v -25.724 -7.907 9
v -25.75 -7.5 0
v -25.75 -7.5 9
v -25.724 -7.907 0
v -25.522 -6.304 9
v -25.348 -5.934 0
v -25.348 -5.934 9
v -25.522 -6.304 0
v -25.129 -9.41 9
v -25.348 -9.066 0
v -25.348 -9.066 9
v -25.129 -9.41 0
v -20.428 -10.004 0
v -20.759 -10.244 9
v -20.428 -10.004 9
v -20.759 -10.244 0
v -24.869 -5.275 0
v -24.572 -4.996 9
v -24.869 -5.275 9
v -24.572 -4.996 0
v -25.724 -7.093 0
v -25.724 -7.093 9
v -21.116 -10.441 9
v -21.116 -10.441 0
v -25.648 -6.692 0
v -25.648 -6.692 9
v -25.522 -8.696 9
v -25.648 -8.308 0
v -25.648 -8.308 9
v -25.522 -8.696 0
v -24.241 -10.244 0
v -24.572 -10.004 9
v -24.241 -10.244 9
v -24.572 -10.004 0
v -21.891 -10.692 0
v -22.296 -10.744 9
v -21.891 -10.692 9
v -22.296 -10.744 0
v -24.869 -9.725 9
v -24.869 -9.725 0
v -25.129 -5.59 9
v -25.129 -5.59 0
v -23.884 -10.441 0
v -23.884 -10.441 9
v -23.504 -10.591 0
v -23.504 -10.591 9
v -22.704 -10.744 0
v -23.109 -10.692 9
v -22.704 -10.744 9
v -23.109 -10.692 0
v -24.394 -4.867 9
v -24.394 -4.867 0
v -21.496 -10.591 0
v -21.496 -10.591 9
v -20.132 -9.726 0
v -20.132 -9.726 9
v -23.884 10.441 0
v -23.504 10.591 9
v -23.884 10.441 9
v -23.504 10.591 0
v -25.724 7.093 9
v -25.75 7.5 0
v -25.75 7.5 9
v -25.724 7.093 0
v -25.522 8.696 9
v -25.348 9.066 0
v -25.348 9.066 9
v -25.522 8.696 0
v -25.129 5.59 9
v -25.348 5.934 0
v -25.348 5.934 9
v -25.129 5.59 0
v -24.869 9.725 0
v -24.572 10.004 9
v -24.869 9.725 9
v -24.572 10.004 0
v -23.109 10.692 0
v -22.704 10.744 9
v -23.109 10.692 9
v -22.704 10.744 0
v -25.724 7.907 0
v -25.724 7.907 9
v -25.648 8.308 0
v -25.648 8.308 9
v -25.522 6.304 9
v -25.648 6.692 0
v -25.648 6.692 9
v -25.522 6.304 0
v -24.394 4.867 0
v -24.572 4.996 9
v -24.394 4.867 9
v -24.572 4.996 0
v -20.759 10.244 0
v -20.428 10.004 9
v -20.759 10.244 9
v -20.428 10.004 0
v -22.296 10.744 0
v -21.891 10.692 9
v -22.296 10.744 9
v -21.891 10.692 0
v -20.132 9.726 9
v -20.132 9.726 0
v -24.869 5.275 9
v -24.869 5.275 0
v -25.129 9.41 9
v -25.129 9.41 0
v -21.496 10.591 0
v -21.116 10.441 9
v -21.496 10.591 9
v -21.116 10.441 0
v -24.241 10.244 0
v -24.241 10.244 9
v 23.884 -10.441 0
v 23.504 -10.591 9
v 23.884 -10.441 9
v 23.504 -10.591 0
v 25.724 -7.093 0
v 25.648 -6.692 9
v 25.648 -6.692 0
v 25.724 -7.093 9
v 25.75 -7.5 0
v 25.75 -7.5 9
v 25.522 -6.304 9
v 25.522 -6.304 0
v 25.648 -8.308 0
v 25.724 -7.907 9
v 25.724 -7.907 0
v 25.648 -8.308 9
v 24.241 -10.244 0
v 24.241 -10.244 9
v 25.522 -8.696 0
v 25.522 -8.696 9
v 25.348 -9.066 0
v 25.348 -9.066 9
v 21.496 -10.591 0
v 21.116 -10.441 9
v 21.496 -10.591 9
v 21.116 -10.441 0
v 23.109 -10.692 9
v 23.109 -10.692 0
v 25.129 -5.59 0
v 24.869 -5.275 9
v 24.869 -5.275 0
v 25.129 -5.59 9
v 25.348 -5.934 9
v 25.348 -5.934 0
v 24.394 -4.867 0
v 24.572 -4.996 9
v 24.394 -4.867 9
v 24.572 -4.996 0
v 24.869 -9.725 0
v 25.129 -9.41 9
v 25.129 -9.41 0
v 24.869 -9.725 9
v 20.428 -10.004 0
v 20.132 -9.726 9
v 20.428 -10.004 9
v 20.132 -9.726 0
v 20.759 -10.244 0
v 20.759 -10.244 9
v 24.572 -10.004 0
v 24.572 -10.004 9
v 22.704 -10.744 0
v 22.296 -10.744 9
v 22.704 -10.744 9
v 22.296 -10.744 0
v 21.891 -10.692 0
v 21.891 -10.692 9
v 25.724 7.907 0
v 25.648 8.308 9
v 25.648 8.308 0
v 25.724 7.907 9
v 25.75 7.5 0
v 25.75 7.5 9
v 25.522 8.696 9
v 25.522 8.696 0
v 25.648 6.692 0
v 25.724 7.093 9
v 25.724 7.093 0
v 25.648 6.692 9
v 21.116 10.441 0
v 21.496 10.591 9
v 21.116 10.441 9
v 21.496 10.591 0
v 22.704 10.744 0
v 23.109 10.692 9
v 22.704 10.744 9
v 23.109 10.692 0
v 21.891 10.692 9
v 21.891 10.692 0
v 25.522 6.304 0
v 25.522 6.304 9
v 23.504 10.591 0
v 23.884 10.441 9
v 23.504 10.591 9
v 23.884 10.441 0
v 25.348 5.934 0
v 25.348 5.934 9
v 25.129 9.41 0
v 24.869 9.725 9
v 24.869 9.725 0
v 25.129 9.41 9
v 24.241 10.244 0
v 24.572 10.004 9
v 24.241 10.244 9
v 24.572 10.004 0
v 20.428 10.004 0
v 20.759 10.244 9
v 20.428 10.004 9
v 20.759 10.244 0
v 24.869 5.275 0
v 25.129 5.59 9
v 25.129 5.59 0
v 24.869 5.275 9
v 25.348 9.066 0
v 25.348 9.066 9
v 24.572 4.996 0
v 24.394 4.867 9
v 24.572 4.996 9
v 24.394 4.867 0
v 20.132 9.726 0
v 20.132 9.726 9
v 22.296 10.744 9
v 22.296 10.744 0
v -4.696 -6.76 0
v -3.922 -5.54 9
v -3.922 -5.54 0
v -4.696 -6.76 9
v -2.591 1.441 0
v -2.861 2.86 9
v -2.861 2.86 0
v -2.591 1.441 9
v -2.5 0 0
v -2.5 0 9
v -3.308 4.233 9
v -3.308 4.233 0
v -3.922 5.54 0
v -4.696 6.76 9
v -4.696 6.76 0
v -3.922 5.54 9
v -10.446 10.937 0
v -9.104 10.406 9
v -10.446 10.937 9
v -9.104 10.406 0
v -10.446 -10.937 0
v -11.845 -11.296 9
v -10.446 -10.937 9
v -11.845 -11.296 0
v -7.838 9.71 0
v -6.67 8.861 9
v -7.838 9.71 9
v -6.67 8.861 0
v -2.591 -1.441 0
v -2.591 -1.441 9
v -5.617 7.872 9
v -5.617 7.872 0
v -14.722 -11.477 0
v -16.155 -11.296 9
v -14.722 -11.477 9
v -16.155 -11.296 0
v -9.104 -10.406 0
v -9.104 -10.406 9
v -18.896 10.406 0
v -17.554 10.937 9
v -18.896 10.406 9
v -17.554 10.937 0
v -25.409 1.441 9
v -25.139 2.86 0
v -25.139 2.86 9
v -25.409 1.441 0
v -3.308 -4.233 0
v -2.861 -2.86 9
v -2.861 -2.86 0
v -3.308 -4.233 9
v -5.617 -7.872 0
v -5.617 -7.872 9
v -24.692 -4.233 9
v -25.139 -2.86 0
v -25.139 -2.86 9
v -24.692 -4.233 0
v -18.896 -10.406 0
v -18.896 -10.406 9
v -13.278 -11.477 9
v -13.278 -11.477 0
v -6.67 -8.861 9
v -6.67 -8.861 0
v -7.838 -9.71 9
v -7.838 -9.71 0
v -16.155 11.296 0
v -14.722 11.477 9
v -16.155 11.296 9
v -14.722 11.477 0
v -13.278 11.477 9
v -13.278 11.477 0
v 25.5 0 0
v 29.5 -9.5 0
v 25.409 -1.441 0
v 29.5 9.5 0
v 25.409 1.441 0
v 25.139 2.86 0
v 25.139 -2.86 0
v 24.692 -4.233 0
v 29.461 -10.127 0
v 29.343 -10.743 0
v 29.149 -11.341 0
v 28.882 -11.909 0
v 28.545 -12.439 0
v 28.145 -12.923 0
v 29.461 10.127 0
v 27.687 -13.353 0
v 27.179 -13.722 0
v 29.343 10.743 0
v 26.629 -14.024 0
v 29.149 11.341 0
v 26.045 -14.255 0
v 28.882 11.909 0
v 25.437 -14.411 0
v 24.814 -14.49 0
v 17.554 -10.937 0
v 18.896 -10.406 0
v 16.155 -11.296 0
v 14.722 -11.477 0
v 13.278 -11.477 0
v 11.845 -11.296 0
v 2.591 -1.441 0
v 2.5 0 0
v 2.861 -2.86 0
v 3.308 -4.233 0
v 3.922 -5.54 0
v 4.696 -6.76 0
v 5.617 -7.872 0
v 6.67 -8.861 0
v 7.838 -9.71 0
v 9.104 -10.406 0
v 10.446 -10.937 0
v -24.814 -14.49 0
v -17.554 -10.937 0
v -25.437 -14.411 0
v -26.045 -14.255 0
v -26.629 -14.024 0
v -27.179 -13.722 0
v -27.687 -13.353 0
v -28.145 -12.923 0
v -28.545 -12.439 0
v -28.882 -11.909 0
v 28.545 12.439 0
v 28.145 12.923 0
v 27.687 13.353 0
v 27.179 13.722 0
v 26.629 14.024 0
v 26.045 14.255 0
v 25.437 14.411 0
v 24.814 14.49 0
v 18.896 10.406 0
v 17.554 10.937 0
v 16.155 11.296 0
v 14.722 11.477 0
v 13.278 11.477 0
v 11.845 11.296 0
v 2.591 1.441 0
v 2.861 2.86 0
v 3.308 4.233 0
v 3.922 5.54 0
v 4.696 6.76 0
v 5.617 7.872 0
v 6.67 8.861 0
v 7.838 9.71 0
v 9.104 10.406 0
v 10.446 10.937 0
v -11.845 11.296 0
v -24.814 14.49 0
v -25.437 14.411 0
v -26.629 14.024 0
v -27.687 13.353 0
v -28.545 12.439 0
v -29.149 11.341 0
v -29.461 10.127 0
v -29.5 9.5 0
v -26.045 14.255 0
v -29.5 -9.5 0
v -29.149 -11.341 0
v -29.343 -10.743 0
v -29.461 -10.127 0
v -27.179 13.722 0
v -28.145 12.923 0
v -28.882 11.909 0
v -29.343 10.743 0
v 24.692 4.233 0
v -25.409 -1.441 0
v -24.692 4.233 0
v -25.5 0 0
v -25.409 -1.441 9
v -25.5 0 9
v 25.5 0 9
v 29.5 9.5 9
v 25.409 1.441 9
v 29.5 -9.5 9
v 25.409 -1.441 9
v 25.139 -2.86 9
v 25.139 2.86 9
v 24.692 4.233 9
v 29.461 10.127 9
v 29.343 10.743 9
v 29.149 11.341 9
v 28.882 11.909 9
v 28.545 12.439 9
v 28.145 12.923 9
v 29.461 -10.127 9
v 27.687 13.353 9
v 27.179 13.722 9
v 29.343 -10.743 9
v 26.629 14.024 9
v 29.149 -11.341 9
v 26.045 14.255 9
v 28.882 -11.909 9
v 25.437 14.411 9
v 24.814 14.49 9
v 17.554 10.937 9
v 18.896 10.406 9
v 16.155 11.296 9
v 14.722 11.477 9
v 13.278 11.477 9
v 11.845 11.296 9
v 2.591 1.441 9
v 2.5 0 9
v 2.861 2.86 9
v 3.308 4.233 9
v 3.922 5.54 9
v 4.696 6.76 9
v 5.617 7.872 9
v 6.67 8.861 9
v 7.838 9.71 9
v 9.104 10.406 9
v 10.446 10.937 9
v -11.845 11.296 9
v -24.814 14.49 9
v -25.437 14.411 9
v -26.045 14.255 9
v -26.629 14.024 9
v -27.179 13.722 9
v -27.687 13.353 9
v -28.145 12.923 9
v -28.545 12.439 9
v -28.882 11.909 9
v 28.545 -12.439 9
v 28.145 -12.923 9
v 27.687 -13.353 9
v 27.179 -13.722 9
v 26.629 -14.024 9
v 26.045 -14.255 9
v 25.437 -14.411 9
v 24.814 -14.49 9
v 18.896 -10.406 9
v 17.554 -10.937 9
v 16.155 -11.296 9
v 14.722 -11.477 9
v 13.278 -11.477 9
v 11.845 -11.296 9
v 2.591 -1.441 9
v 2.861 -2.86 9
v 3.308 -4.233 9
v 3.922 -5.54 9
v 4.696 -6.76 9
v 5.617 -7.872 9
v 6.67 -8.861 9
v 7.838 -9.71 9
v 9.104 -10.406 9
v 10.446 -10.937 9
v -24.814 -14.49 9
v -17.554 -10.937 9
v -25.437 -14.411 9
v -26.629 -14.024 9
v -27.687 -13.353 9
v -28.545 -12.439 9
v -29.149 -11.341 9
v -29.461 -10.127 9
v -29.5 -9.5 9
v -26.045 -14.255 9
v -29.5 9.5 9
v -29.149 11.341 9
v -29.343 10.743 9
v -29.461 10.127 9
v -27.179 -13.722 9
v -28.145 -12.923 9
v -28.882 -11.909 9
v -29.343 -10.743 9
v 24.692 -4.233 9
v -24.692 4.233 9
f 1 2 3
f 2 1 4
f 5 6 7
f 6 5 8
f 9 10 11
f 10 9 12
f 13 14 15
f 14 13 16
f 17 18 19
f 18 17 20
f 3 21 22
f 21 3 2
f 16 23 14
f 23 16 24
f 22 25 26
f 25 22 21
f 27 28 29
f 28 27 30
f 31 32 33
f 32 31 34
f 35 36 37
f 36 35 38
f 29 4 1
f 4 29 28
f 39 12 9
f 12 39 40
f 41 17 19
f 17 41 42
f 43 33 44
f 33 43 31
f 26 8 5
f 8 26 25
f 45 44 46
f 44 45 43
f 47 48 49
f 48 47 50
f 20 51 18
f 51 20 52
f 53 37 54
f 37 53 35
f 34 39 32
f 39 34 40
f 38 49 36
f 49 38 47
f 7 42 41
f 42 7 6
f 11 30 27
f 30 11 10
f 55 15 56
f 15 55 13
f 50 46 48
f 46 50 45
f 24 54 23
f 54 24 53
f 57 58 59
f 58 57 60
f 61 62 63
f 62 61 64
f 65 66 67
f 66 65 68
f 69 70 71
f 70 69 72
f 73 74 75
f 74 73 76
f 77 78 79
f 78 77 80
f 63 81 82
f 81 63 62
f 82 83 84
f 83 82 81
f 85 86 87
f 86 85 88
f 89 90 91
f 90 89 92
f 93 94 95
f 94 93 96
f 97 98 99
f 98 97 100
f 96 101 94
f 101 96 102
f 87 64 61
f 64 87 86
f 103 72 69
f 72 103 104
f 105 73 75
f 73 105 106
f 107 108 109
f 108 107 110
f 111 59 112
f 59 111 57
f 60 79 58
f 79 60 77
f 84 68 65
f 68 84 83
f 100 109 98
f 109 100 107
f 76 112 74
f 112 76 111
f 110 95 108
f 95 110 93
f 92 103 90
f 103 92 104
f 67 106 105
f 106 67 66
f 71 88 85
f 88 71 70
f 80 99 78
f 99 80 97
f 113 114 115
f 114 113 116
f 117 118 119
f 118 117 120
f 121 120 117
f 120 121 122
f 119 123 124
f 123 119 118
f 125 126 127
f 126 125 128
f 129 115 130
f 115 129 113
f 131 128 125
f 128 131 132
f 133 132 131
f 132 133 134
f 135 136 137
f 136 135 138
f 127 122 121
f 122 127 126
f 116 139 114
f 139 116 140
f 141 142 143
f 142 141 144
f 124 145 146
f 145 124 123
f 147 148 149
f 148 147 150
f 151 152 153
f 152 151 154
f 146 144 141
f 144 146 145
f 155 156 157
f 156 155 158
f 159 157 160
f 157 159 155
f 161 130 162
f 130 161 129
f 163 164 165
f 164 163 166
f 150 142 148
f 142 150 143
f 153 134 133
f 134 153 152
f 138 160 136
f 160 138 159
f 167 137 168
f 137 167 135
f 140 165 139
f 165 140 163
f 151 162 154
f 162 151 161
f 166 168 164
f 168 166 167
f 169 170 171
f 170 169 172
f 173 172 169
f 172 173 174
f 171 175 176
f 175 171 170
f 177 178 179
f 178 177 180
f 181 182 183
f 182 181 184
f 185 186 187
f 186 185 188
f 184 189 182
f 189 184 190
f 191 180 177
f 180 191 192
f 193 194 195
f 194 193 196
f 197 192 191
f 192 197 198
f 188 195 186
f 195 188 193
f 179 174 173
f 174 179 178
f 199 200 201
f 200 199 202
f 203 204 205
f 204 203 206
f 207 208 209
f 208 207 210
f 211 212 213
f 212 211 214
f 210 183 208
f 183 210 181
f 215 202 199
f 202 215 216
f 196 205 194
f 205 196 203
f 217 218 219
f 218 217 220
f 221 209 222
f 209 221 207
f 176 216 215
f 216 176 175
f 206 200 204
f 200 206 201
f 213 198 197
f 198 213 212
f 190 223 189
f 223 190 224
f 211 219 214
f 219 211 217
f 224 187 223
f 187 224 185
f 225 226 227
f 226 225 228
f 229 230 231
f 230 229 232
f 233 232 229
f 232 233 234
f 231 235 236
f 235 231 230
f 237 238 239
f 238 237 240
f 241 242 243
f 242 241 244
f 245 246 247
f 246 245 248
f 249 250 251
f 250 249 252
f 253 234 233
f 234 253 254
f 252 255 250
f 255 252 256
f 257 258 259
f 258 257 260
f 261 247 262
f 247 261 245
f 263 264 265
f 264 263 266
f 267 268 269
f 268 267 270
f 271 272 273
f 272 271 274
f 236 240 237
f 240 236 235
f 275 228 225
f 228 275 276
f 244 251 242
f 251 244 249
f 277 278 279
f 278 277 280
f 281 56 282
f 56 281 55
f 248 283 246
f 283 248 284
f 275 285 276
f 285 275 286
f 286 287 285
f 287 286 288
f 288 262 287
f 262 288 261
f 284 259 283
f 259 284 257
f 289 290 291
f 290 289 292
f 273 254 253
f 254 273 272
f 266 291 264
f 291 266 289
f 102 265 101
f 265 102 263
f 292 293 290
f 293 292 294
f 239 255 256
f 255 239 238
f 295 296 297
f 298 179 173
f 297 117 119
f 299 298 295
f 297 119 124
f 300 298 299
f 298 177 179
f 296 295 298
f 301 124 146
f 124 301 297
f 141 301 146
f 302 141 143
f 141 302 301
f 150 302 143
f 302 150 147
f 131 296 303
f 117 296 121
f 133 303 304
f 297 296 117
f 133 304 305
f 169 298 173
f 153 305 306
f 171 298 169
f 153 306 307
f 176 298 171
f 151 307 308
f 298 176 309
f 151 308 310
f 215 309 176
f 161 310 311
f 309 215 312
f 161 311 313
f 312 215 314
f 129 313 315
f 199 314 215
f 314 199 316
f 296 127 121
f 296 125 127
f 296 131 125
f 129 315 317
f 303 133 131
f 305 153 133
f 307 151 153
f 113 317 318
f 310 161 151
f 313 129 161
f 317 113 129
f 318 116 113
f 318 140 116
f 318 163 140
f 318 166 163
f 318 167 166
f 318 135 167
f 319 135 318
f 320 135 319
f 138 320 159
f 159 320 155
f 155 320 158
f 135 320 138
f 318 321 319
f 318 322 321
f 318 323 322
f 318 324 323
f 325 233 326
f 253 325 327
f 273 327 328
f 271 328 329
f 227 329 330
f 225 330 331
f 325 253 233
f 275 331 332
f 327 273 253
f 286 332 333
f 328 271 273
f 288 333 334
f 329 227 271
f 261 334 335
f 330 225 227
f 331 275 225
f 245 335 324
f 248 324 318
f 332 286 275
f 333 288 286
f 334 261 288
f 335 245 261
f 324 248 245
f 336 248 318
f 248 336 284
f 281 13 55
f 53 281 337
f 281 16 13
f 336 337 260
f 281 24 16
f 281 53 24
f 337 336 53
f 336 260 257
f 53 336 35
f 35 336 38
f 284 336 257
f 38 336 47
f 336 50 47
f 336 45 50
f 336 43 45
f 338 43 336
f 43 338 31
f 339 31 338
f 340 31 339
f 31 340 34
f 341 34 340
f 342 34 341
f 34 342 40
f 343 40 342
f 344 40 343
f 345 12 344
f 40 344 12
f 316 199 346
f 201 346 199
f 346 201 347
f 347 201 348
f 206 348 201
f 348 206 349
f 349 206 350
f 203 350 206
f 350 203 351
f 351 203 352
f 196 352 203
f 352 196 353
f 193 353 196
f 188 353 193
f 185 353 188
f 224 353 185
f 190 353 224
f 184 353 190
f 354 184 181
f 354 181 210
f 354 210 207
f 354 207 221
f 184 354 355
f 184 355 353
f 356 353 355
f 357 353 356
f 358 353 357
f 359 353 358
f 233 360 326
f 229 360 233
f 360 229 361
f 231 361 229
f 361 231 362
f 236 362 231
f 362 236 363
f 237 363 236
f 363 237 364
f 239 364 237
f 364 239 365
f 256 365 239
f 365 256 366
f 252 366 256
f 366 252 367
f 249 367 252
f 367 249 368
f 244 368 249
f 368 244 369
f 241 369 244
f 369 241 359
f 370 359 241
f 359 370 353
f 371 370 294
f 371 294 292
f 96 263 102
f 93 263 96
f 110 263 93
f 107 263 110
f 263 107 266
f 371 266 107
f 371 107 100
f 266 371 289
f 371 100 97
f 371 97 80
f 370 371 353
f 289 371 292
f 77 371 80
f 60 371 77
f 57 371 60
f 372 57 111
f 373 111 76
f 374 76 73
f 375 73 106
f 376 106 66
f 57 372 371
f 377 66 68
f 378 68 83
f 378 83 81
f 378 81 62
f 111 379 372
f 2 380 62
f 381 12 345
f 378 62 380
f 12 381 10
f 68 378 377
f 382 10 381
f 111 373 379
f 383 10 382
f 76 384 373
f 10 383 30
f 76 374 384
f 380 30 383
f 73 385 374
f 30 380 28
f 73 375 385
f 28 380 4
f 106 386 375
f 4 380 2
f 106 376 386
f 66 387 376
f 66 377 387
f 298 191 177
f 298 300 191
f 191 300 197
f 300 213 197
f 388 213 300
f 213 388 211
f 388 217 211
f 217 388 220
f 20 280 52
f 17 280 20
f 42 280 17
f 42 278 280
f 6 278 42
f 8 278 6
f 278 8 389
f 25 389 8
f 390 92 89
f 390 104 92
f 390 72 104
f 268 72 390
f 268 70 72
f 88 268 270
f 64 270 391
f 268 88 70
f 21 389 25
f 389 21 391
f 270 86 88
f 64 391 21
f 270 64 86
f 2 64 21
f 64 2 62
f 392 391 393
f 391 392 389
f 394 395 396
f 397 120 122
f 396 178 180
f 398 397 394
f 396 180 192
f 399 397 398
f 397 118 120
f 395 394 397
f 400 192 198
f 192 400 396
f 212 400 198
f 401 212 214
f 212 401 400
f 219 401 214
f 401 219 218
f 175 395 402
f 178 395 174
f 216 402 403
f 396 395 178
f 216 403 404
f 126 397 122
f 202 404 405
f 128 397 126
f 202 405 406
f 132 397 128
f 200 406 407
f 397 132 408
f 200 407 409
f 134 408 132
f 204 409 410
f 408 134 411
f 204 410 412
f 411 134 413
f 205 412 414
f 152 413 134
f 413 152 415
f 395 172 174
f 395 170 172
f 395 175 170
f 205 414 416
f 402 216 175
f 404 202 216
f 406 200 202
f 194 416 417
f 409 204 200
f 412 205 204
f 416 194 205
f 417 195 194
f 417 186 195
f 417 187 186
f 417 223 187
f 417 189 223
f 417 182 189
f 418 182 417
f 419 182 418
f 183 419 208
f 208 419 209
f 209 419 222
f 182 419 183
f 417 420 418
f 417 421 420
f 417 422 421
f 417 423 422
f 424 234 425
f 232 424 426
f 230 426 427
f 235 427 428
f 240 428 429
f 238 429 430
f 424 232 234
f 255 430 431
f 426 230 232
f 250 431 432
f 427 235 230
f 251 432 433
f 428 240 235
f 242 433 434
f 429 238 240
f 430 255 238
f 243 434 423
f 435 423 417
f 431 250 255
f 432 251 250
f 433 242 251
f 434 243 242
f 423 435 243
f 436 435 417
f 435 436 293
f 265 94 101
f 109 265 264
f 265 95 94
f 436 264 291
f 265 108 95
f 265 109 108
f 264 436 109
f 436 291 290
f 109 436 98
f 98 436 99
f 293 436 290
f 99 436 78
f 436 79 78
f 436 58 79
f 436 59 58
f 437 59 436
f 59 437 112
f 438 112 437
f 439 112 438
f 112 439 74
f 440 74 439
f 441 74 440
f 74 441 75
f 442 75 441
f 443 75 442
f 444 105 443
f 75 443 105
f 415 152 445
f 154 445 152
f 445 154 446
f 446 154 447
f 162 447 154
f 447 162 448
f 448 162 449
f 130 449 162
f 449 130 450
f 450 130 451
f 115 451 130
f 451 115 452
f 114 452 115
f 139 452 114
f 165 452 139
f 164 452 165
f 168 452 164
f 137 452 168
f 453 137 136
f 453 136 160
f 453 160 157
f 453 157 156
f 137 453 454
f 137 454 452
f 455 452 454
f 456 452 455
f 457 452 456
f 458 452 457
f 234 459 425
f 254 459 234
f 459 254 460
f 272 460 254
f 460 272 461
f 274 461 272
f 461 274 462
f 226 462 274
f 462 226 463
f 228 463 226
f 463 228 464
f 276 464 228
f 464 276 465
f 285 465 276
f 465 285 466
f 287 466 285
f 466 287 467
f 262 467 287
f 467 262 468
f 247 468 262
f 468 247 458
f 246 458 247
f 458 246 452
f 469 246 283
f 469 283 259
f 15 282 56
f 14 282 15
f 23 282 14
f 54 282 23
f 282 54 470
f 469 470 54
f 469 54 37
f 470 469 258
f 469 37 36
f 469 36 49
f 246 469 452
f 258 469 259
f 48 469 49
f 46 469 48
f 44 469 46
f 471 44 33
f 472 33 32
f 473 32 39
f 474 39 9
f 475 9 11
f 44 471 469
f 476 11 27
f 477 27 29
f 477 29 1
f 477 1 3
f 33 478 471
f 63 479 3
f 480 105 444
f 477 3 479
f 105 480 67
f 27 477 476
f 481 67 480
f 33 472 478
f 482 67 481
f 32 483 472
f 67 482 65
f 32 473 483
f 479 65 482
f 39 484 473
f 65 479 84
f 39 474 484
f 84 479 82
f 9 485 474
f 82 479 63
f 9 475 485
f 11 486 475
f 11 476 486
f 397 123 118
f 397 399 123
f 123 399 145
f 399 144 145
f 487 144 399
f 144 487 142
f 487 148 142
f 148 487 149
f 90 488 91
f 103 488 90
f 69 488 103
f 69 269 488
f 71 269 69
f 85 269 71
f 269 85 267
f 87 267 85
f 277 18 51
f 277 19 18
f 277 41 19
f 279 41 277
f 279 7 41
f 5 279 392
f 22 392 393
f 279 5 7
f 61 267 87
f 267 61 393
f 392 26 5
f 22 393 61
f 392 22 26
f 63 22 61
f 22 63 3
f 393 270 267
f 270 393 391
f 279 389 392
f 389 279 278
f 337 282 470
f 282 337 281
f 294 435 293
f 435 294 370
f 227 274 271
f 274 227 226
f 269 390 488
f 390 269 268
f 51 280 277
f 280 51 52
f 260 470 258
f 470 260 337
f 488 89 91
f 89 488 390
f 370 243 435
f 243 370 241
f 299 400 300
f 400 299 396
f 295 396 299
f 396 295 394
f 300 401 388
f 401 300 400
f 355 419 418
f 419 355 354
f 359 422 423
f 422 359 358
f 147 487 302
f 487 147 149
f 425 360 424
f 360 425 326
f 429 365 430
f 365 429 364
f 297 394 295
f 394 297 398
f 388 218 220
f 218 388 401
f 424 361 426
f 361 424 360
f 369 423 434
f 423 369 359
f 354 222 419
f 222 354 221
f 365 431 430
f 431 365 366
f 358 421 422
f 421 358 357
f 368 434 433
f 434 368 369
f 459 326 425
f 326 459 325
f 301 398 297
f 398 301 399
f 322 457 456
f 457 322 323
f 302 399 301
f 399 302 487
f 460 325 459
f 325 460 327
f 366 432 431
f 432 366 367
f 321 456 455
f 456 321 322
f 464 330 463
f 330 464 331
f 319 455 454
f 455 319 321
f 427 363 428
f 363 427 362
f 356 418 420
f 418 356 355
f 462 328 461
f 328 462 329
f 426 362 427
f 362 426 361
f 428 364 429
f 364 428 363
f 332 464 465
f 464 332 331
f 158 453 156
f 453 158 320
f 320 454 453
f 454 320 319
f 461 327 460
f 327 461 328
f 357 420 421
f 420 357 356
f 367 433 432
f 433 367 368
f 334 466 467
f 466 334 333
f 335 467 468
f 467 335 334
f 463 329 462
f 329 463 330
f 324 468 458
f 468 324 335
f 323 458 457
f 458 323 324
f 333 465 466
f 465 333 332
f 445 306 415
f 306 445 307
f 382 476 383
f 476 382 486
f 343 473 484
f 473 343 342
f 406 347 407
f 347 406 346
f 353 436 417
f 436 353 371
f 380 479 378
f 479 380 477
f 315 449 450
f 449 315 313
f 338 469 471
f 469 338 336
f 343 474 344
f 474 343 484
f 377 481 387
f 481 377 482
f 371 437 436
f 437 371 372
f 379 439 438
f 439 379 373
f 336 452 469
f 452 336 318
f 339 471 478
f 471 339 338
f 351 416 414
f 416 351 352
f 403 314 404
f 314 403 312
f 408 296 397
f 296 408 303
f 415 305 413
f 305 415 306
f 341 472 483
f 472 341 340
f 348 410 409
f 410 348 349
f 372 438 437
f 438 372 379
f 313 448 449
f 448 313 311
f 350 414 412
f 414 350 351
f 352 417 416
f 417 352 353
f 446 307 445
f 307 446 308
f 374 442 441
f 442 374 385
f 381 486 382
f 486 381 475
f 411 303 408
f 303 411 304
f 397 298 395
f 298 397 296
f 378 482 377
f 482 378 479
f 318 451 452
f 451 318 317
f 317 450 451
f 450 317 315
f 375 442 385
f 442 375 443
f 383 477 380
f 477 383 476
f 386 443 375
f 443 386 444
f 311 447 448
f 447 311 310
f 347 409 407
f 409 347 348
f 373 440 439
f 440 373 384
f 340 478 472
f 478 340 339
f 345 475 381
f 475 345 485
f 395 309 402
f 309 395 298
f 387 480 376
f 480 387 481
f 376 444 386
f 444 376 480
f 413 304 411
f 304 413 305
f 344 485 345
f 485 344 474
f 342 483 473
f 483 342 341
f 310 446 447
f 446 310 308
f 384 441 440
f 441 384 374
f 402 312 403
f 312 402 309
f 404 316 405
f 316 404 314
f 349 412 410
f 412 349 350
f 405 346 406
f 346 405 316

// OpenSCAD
$fn = 50;


difference() {
	union() {
		hull() {
			translate(v = [-24.5000000000, 9.5000000000, 0]) {
				cylinder(h = 9, r = 5);
			}
			translate(v = [24.5000000000, 9.5000000000, 0]) {
				cylinder(h = 9, r = 5);
			}
			translate(v = [-24.5000000000, -9.5000000000, 0]) {
				cylinder(h = 9, r = 5);
			}
			translate(v = [24.5000000000, -9.5000000000, 0]) {
				cylinder(h = 9, r = 5);
			}
		}
	}
	union() {
		#translate(v = [-22.5000000000, -7.5000000000, -100.0000000000]) {
			cylinder(h = 200, r = 3.2500000000);
		}
		#translate(v = [-22.5000000000, 7.5000000000, -100.0000000000]) {
			cylinder(h = 200, r = 3.2500000000);
		}
		#translate(v = [22.5000000000, -7.5000000000, -100.0000000000]) {
			cylinder(h = 200, r = 3.2500000000);
		}
		#translate(v = [22.5000000000, 7.5000000000, -100.0000000000]) {
			cylinder(h = 200, r = 3.2500000000);
		}
		#translate(v = [-14.0000000000, 0, 0]) {
			cylinder(h = 9, r = 11.5000000000);
		}
		#translate(v = [14.0000000000, 0, 0]) {
			cylinder(h = 9, r = 11.5000000000);
		}
	}
}
